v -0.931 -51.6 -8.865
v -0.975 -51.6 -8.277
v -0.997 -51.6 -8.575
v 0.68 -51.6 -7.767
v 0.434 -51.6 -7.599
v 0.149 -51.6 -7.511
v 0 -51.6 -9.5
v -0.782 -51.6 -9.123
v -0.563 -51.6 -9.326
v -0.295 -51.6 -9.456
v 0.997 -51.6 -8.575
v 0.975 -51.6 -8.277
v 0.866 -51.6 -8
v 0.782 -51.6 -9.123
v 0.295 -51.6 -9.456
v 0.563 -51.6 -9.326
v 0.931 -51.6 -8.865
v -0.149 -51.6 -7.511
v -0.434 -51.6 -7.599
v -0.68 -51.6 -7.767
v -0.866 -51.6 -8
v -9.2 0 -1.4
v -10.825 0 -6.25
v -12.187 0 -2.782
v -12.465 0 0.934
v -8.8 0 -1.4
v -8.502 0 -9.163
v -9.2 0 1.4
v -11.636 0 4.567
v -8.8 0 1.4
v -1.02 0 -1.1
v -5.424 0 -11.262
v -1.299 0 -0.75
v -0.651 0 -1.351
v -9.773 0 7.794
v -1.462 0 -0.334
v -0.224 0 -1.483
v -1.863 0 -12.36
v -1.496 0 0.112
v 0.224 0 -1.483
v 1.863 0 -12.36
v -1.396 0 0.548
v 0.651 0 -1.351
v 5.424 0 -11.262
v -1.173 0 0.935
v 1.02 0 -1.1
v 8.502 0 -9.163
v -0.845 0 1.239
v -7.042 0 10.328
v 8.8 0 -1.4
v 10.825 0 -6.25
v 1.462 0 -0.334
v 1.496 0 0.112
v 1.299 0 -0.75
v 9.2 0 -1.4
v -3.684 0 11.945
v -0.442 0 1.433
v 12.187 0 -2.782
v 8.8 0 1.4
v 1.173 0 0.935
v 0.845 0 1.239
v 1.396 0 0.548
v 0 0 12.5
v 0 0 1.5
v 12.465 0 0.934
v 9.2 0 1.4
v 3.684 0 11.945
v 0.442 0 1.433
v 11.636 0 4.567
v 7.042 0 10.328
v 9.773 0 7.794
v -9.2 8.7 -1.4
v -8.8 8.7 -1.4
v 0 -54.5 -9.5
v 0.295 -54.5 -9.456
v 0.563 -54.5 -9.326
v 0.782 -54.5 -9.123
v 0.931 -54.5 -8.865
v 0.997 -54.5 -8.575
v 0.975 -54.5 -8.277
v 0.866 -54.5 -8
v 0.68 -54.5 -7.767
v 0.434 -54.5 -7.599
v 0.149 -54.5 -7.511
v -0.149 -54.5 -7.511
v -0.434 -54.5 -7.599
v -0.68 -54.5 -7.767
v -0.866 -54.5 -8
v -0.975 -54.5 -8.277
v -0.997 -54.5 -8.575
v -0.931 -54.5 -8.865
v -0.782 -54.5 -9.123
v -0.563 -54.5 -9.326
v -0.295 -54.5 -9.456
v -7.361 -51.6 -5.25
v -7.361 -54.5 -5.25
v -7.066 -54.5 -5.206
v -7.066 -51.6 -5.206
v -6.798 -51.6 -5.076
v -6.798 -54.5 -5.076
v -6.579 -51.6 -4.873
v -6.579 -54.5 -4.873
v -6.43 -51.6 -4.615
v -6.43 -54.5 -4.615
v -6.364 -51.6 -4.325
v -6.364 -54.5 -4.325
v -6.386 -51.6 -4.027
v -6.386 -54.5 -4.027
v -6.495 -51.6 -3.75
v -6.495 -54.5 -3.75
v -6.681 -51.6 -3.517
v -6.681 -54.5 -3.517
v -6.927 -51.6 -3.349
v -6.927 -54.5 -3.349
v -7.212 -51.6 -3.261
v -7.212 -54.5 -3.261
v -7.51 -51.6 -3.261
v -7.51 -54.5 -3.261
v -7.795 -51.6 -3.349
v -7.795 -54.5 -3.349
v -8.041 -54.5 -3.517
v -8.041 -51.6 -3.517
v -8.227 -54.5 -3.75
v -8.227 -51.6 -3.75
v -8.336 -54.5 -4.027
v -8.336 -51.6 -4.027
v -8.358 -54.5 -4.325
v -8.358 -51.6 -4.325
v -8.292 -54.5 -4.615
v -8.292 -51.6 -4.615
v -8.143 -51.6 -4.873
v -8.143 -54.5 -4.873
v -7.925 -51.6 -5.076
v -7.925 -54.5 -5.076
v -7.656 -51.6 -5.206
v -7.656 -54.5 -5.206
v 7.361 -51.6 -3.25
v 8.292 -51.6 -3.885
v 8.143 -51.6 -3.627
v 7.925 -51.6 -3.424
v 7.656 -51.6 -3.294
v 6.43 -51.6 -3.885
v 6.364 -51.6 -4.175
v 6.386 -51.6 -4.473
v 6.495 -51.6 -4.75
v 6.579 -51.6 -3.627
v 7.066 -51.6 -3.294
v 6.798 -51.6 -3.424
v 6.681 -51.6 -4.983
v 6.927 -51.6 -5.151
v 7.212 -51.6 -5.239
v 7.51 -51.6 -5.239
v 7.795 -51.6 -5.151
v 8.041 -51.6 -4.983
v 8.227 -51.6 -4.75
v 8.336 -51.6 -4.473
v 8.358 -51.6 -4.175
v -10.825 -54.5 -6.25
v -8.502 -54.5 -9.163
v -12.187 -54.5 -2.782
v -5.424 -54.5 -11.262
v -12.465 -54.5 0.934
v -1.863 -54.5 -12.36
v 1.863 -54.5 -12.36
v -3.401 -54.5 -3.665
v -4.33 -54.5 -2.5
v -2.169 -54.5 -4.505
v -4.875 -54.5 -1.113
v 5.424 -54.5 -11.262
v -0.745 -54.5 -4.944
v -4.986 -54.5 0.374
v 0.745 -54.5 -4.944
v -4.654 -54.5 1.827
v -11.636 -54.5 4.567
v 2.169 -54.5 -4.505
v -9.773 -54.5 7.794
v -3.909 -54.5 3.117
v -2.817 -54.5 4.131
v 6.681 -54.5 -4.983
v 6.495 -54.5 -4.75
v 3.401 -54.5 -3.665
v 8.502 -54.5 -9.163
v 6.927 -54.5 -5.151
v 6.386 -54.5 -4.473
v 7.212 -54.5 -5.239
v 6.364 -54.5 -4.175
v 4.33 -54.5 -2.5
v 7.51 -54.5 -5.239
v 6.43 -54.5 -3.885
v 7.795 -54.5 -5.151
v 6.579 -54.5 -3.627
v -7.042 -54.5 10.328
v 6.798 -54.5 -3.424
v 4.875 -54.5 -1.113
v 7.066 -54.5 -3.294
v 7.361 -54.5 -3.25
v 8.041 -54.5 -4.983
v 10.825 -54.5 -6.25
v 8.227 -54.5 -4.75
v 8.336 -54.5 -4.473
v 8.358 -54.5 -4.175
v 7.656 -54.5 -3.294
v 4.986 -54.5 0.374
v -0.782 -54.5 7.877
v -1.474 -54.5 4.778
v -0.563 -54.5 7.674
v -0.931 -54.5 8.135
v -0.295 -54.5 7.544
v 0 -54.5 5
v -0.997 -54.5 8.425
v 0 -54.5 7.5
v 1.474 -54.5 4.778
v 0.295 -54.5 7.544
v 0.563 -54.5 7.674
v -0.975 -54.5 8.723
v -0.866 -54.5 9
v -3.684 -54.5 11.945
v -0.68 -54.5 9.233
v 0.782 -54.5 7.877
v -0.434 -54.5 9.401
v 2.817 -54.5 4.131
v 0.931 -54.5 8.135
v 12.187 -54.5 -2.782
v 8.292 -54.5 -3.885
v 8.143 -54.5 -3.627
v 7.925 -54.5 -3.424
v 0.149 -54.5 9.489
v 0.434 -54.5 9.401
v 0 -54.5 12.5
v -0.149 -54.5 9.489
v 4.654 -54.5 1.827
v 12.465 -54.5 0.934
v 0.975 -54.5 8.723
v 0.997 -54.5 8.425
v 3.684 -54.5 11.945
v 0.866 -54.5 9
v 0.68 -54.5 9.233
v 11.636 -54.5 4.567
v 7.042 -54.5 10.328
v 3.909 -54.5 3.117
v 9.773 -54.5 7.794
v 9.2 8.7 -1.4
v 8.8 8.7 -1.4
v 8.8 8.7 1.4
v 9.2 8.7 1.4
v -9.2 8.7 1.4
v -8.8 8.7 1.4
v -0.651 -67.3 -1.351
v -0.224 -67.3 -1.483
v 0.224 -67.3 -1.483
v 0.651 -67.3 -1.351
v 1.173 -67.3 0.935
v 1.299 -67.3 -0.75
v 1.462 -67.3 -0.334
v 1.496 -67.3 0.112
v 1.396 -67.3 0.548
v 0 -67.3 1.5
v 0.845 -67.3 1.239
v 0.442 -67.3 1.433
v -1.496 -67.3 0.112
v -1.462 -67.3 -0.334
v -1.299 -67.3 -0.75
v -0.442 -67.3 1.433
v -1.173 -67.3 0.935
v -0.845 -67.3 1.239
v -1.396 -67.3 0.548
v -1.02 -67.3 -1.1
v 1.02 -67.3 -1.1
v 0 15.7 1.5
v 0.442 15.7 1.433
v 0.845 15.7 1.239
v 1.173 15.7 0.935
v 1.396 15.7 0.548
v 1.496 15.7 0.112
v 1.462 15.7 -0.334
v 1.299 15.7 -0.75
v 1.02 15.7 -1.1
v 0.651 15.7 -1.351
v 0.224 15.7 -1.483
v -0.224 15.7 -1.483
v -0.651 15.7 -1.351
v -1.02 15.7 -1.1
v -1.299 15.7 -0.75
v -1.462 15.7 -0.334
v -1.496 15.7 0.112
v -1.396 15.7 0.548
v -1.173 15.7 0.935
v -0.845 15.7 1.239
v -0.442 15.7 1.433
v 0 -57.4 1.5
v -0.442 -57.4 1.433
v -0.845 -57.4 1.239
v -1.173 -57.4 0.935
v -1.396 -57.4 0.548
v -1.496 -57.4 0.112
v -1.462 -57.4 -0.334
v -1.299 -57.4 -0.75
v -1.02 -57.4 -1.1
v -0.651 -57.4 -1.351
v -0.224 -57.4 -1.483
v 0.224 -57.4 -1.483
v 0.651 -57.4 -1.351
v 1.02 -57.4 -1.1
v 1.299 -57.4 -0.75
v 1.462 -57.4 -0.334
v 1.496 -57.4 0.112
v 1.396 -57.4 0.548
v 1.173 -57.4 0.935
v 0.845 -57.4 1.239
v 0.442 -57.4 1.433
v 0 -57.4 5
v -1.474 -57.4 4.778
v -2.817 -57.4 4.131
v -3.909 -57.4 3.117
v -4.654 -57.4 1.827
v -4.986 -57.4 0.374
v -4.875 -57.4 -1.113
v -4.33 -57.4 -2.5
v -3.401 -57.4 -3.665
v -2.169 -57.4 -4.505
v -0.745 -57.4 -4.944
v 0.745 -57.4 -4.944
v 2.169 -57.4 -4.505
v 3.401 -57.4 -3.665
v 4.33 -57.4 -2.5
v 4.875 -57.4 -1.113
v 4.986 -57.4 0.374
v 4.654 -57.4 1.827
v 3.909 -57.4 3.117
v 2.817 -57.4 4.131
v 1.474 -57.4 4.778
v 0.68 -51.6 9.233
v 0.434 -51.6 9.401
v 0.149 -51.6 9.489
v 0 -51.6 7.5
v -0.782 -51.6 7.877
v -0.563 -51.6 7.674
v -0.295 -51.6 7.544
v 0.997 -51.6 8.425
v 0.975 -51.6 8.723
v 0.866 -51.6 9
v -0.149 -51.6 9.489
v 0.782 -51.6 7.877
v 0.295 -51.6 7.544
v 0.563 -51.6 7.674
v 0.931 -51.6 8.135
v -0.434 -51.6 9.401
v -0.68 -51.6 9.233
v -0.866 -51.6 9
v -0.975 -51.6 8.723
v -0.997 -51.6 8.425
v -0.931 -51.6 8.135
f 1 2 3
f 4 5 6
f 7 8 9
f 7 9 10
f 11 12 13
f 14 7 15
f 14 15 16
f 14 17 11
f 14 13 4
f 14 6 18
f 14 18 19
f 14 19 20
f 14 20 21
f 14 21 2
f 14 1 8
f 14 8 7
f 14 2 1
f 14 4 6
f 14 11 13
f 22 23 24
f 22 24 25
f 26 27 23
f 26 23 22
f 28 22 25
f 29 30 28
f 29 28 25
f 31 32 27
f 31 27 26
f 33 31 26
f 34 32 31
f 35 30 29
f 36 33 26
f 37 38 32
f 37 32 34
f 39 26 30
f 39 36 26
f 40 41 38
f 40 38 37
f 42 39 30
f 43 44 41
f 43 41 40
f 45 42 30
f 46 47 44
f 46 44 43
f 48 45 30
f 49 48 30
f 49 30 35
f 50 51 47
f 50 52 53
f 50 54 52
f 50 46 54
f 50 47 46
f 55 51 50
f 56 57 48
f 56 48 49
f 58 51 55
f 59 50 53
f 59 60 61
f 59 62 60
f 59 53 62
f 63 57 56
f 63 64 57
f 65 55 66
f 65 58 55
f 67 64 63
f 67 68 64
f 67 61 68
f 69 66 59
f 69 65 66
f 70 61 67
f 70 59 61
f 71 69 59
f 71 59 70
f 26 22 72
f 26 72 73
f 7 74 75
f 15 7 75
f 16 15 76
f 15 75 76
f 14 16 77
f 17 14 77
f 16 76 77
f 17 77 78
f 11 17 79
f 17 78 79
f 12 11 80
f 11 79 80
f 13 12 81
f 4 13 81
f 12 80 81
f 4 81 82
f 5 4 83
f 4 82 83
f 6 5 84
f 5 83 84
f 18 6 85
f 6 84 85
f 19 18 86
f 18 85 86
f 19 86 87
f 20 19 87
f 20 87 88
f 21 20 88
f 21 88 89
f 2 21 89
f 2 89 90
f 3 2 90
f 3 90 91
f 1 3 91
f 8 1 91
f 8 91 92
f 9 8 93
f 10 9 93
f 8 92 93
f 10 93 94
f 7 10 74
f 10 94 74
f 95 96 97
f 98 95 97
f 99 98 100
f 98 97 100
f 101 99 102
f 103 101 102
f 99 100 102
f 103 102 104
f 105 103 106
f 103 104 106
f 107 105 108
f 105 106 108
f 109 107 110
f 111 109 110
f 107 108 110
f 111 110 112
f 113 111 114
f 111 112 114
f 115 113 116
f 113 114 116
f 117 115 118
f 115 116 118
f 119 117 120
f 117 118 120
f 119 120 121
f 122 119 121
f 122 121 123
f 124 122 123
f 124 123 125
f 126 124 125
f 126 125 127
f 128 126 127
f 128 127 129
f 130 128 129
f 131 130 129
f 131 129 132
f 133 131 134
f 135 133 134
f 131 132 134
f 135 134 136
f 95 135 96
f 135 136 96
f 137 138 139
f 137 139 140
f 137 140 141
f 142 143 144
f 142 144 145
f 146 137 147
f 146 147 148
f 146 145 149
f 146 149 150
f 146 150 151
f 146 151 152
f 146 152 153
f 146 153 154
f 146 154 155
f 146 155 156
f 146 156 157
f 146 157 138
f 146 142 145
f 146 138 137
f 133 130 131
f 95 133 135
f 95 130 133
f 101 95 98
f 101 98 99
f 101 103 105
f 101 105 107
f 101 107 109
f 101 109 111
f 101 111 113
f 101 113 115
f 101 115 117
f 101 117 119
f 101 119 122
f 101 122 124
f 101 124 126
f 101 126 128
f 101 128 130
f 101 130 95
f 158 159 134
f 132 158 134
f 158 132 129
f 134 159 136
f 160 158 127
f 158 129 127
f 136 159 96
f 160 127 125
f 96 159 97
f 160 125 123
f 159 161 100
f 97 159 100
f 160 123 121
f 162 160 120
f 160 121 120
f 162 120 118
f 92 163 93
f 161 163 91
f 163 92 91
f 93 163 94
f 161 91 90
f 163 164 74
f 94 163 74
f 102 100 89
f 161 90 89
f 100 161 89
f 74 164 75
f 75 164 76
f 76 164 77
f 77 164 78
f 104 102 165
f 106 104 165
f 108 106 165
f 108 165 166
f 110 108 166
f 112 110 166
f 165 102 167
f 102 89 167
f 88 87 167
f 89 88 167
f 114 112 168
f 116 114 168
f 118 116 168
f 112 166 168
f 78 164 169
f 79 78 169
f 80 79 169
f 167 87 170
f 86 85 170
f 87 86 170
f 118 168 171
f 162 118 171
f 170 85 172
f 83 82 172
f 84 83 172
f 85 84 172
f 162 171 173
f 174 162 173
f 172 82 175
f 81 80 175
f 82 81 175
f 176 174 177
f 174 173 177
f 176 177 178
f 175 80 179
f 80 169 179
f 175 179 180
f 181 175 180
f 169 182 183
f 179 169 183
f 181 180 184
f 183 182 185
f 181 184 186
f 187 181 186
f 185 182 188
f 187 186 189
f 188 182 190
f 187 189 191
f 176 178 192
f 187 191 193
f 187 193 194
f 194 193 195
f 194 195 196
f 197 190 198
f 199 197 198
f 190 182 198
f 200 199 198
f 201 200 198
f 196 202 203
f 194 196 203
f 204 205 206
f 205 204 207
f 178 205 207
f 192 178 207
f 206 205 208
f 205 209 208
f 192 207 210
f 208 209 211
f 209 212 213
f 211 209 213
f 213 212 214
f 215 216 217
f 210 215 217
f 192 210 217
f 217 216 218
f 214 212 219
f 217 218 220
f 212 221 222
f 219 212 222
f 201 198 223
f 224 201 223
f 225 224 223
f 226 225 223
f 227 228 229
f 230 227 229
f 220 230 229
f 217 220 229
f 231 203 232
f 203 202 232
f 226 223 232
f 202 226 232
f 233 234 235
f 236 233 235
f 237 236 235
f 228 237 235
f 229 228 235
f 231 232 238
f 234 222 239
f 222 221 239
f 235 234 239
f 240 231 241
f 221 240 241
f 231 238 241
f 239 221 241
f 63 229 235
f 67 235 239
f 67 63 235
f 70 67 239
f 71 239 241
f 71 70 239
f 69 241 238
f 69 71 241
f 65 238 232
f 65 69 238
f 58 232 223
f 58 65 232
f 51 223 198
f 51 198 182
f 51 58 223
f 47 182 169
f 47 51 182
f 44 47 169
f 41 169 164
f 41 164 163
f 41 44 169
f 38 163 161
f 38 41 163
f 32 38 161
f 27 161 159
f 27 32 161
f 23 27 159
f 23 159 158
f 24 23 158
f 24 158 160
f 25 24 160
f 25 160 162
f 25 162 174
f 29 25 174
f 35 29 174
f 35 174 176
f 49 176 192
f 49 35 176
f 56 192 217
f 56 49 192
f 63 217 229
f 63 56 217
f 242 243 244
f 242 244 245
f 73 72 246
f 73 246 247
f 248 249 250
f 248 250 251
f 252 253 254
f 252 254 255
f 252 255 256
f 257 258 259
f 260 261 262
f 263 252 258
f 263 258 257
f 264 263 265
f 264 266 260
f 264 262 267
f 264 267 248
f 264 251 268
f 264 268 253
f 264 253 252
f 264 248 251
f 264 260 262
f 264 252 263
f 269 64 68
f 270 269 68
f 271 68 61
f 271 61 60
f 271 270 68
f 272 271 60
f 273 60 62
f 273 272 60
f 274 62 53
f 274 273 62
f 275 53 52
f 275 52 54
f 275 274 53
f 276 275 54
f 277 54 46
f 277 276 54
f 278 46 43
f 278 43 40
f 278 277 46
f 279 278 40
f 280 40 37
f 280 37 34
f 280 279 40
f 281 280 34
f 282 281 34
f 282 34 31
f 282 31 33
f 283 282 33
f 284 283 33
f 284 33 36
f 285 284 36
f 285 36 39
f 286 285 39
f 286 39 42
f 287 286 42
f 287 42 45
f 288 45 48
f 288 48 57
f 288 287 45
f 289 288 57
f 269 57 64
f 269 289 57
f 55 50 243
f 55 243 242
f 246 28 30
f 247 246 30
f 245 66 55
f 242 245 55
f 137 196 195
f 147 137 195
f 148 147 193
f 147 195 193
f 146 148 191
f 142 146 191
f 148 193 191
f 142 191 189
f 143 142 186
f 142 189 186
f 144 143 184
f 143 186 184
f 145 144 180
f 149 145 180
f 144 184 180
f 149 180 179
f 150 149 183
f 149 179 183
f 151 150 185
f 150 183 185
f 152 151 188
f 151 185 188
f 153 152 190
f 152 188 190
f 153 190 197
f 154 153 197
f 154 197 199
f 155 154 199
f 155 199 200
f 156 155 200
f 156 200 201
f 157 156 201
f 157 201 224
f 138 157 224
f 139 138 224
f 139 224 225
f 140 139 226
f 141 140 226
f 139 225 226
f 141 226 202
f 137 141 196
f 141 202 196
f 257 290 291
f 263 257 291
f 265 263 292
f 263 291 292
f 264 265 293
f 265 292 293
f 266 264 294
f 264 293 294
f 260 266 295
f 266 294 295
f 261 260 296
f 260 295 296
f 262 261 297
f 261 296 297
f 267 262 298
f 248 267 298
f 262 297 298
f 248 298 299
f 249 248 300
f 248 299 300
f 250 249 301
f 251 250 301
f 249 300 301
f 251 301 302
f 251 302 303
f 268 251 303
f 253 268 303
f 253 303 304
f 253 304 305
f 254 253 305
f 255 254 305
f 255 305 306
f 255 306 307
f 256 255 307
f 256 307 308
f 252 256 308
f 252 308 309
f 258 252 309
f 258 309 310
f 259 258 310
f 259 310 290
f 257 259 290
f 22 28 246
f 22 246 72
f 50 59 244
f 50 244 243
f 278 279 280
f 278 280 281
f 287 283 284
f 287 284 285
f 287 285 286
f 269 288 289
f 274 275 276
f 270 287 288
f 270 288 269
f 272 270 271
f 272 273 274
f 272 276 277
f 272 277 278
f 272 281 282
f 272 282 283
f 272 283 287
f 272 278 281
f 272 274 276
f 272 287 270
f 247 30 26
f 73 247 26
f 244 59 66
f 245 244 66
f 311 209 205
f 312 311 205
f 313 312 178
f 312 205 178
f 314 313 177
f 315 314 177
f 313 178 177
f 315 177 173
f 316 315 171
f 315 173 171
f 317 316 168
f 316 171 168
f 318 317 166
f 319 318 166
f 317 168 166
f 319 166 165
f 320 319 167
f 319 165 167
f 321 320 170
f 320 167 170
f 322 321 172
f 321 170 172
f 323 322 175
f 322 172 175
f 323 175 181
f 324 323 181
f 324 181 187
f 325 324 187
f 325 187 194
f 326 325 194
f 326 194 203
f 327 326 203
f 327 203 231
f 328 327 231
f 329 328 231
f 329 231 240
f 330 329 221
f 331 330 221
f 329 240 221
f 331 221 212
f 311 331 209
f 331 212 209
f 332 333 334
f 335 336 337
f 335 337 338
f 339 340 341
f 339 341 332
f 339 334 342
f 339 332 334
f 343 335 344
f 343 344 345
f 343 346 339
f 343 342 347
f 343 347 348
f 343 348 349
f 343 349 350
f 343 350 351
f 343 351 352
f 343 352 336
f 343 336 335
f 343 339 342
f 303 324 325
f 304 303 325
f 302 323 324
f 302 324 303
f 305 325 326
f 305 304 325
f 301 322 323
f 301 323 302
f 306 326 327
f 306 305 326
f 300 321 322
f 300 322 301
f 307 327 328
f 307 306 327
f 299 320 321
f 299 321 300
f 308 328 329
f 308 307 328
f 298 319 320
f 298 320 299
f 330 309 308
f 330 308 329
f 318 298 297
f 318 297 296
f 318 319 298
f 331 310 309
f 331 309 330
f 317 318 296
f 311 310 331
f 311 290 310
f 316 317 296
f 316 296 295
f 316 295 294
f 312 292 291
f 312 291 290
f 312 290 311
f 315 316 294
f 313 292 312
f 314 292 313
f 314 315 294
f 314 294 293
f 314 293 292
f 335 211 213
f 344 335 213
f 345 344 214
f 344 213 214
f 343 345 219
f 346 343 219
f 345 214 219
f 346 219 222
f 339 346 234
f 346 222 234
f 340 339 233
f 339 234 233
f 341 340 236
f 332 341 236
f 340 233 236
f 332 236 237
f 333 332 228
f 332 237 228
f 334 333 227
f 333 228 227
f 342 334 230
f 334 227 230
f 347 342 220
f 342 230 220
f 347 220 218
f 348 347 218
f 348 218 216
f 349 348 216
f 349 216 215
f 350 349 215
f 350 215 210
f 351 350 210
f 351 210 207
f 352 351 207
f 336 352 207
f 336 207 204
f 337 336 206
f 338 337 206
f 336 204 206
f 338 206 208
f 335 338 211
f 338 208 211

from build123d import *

# Parameters (mm, degrees)
SKETCH1_R           = 12.5
BOSS_EXTRUDE1_DEPTH = 54.5
SKETCH2_R           = 1.5
BOSS_EXTRUDE2_DEPTH = 12.8
BOSS_EXTRUDE3_START = 15.7
SKETCH3_R           = 1.5
BOSS_EXTRUDE3_DEPTH = 15.7
SKETCH4_W           = 0.4
SKETCH4_H           = 2.8
BOSS_EXTRUDE4_DEPTH = 8.7
SKETCH5_R           = 1
CUT_EXTRUDE1_DEPTH  = 2.9
SKETCH6_R           = 5
BOSS_EXTRUDE5_DEPTH = 2.9


with BuildPart() as part:
    # Sketch1 → Boss-Extrude1 (new body)
    with BuildSketch(Plane(origin=(0, 0, 0), x_dir=(1, 0, 0), z_dir=(0, 1, 0))):
        with Locations(Location((0, 0, 0), (0, 0, 270))):
            Circle(SKETCH1_R)
    extrude(amount=-BOSS_EXTRUDE1_DEPTH)

    # Sketch2 → Boss-Extrude2 (add)
    with BuildSketch(Plane.XZ.offset(54.5)):
        with Locations(Location((0, 0, 0), (0, 0, 90))):
            Circle(SKETCH2_R)
    extrude(amount=BOSS_EXTRUDE2_DEPTH)

    # Sketch3 → Boss-Extrude3 (add)
    with BuildSketch(Plane(origin=(0, 0, 0), x_dir=(1, 0, 0), z_dir=(0, 1, 0)).offset(BOSS_EXTRUDE3_START)):
        with Locations(Location((0, 0, 0), (0, 0, 270))):
            Circle(SKETCH3_R)
    extrude(amount=-BOSS_EXTRUDE3_DEPTH)

    # Sketch4 → Boss-Extrude4 (add)
    with BuildSketch(Plane(origin=(0, 0, 0), x_dir=(1, 0, 0), z_dir=(0, 1, 0))):
        with Locations((9, 0)):
            Rectangle(SKETCH4_W, SKETCH4_H)
        with Locations((-9, 0)):
            Rectangle(SKETCH4_W, SKETCH4_H)
    extrude(amount=BOSS_EXTRUDE4_DEPTH)

    # Sketch5 → Cut-Extrude1 (cut)
    with BuildSketch(Plane.XZ.offset(54.5)):
        with Locations(Location((0, 8.5, 0), (0, 0, 270))):
            Circle(SKETCH5_R)
        with Locations(Location((0, -8.5, 0), (0, 0, 270))):
            Circle(SKETCH5_R)
        with Locations(Location((-7.361215932, -4.25, 0), (0, 0, 270))):
            Circle(SKETCH5_R)
        with Locations(Location((7.361215932, -4.25, 0), (0, 0, 90))):
            Circle(SKETCH5_R)
    extrude(amount=-CUT_EXTRUDE1_DEPTH, mode=Mode.SUBTRACT)

    # Sketch6 → Boss-Extrude5 (add)
    with BuildSketch(Plane.XZ.offset(54.5)):
        with Locations(Location((0, 0, 0), (0, 0, 90))):
            Circle(SKETCH6_R)
    extrude(amount=BOSS_EXTRUDE5_DEPTH)


solid = part.part
